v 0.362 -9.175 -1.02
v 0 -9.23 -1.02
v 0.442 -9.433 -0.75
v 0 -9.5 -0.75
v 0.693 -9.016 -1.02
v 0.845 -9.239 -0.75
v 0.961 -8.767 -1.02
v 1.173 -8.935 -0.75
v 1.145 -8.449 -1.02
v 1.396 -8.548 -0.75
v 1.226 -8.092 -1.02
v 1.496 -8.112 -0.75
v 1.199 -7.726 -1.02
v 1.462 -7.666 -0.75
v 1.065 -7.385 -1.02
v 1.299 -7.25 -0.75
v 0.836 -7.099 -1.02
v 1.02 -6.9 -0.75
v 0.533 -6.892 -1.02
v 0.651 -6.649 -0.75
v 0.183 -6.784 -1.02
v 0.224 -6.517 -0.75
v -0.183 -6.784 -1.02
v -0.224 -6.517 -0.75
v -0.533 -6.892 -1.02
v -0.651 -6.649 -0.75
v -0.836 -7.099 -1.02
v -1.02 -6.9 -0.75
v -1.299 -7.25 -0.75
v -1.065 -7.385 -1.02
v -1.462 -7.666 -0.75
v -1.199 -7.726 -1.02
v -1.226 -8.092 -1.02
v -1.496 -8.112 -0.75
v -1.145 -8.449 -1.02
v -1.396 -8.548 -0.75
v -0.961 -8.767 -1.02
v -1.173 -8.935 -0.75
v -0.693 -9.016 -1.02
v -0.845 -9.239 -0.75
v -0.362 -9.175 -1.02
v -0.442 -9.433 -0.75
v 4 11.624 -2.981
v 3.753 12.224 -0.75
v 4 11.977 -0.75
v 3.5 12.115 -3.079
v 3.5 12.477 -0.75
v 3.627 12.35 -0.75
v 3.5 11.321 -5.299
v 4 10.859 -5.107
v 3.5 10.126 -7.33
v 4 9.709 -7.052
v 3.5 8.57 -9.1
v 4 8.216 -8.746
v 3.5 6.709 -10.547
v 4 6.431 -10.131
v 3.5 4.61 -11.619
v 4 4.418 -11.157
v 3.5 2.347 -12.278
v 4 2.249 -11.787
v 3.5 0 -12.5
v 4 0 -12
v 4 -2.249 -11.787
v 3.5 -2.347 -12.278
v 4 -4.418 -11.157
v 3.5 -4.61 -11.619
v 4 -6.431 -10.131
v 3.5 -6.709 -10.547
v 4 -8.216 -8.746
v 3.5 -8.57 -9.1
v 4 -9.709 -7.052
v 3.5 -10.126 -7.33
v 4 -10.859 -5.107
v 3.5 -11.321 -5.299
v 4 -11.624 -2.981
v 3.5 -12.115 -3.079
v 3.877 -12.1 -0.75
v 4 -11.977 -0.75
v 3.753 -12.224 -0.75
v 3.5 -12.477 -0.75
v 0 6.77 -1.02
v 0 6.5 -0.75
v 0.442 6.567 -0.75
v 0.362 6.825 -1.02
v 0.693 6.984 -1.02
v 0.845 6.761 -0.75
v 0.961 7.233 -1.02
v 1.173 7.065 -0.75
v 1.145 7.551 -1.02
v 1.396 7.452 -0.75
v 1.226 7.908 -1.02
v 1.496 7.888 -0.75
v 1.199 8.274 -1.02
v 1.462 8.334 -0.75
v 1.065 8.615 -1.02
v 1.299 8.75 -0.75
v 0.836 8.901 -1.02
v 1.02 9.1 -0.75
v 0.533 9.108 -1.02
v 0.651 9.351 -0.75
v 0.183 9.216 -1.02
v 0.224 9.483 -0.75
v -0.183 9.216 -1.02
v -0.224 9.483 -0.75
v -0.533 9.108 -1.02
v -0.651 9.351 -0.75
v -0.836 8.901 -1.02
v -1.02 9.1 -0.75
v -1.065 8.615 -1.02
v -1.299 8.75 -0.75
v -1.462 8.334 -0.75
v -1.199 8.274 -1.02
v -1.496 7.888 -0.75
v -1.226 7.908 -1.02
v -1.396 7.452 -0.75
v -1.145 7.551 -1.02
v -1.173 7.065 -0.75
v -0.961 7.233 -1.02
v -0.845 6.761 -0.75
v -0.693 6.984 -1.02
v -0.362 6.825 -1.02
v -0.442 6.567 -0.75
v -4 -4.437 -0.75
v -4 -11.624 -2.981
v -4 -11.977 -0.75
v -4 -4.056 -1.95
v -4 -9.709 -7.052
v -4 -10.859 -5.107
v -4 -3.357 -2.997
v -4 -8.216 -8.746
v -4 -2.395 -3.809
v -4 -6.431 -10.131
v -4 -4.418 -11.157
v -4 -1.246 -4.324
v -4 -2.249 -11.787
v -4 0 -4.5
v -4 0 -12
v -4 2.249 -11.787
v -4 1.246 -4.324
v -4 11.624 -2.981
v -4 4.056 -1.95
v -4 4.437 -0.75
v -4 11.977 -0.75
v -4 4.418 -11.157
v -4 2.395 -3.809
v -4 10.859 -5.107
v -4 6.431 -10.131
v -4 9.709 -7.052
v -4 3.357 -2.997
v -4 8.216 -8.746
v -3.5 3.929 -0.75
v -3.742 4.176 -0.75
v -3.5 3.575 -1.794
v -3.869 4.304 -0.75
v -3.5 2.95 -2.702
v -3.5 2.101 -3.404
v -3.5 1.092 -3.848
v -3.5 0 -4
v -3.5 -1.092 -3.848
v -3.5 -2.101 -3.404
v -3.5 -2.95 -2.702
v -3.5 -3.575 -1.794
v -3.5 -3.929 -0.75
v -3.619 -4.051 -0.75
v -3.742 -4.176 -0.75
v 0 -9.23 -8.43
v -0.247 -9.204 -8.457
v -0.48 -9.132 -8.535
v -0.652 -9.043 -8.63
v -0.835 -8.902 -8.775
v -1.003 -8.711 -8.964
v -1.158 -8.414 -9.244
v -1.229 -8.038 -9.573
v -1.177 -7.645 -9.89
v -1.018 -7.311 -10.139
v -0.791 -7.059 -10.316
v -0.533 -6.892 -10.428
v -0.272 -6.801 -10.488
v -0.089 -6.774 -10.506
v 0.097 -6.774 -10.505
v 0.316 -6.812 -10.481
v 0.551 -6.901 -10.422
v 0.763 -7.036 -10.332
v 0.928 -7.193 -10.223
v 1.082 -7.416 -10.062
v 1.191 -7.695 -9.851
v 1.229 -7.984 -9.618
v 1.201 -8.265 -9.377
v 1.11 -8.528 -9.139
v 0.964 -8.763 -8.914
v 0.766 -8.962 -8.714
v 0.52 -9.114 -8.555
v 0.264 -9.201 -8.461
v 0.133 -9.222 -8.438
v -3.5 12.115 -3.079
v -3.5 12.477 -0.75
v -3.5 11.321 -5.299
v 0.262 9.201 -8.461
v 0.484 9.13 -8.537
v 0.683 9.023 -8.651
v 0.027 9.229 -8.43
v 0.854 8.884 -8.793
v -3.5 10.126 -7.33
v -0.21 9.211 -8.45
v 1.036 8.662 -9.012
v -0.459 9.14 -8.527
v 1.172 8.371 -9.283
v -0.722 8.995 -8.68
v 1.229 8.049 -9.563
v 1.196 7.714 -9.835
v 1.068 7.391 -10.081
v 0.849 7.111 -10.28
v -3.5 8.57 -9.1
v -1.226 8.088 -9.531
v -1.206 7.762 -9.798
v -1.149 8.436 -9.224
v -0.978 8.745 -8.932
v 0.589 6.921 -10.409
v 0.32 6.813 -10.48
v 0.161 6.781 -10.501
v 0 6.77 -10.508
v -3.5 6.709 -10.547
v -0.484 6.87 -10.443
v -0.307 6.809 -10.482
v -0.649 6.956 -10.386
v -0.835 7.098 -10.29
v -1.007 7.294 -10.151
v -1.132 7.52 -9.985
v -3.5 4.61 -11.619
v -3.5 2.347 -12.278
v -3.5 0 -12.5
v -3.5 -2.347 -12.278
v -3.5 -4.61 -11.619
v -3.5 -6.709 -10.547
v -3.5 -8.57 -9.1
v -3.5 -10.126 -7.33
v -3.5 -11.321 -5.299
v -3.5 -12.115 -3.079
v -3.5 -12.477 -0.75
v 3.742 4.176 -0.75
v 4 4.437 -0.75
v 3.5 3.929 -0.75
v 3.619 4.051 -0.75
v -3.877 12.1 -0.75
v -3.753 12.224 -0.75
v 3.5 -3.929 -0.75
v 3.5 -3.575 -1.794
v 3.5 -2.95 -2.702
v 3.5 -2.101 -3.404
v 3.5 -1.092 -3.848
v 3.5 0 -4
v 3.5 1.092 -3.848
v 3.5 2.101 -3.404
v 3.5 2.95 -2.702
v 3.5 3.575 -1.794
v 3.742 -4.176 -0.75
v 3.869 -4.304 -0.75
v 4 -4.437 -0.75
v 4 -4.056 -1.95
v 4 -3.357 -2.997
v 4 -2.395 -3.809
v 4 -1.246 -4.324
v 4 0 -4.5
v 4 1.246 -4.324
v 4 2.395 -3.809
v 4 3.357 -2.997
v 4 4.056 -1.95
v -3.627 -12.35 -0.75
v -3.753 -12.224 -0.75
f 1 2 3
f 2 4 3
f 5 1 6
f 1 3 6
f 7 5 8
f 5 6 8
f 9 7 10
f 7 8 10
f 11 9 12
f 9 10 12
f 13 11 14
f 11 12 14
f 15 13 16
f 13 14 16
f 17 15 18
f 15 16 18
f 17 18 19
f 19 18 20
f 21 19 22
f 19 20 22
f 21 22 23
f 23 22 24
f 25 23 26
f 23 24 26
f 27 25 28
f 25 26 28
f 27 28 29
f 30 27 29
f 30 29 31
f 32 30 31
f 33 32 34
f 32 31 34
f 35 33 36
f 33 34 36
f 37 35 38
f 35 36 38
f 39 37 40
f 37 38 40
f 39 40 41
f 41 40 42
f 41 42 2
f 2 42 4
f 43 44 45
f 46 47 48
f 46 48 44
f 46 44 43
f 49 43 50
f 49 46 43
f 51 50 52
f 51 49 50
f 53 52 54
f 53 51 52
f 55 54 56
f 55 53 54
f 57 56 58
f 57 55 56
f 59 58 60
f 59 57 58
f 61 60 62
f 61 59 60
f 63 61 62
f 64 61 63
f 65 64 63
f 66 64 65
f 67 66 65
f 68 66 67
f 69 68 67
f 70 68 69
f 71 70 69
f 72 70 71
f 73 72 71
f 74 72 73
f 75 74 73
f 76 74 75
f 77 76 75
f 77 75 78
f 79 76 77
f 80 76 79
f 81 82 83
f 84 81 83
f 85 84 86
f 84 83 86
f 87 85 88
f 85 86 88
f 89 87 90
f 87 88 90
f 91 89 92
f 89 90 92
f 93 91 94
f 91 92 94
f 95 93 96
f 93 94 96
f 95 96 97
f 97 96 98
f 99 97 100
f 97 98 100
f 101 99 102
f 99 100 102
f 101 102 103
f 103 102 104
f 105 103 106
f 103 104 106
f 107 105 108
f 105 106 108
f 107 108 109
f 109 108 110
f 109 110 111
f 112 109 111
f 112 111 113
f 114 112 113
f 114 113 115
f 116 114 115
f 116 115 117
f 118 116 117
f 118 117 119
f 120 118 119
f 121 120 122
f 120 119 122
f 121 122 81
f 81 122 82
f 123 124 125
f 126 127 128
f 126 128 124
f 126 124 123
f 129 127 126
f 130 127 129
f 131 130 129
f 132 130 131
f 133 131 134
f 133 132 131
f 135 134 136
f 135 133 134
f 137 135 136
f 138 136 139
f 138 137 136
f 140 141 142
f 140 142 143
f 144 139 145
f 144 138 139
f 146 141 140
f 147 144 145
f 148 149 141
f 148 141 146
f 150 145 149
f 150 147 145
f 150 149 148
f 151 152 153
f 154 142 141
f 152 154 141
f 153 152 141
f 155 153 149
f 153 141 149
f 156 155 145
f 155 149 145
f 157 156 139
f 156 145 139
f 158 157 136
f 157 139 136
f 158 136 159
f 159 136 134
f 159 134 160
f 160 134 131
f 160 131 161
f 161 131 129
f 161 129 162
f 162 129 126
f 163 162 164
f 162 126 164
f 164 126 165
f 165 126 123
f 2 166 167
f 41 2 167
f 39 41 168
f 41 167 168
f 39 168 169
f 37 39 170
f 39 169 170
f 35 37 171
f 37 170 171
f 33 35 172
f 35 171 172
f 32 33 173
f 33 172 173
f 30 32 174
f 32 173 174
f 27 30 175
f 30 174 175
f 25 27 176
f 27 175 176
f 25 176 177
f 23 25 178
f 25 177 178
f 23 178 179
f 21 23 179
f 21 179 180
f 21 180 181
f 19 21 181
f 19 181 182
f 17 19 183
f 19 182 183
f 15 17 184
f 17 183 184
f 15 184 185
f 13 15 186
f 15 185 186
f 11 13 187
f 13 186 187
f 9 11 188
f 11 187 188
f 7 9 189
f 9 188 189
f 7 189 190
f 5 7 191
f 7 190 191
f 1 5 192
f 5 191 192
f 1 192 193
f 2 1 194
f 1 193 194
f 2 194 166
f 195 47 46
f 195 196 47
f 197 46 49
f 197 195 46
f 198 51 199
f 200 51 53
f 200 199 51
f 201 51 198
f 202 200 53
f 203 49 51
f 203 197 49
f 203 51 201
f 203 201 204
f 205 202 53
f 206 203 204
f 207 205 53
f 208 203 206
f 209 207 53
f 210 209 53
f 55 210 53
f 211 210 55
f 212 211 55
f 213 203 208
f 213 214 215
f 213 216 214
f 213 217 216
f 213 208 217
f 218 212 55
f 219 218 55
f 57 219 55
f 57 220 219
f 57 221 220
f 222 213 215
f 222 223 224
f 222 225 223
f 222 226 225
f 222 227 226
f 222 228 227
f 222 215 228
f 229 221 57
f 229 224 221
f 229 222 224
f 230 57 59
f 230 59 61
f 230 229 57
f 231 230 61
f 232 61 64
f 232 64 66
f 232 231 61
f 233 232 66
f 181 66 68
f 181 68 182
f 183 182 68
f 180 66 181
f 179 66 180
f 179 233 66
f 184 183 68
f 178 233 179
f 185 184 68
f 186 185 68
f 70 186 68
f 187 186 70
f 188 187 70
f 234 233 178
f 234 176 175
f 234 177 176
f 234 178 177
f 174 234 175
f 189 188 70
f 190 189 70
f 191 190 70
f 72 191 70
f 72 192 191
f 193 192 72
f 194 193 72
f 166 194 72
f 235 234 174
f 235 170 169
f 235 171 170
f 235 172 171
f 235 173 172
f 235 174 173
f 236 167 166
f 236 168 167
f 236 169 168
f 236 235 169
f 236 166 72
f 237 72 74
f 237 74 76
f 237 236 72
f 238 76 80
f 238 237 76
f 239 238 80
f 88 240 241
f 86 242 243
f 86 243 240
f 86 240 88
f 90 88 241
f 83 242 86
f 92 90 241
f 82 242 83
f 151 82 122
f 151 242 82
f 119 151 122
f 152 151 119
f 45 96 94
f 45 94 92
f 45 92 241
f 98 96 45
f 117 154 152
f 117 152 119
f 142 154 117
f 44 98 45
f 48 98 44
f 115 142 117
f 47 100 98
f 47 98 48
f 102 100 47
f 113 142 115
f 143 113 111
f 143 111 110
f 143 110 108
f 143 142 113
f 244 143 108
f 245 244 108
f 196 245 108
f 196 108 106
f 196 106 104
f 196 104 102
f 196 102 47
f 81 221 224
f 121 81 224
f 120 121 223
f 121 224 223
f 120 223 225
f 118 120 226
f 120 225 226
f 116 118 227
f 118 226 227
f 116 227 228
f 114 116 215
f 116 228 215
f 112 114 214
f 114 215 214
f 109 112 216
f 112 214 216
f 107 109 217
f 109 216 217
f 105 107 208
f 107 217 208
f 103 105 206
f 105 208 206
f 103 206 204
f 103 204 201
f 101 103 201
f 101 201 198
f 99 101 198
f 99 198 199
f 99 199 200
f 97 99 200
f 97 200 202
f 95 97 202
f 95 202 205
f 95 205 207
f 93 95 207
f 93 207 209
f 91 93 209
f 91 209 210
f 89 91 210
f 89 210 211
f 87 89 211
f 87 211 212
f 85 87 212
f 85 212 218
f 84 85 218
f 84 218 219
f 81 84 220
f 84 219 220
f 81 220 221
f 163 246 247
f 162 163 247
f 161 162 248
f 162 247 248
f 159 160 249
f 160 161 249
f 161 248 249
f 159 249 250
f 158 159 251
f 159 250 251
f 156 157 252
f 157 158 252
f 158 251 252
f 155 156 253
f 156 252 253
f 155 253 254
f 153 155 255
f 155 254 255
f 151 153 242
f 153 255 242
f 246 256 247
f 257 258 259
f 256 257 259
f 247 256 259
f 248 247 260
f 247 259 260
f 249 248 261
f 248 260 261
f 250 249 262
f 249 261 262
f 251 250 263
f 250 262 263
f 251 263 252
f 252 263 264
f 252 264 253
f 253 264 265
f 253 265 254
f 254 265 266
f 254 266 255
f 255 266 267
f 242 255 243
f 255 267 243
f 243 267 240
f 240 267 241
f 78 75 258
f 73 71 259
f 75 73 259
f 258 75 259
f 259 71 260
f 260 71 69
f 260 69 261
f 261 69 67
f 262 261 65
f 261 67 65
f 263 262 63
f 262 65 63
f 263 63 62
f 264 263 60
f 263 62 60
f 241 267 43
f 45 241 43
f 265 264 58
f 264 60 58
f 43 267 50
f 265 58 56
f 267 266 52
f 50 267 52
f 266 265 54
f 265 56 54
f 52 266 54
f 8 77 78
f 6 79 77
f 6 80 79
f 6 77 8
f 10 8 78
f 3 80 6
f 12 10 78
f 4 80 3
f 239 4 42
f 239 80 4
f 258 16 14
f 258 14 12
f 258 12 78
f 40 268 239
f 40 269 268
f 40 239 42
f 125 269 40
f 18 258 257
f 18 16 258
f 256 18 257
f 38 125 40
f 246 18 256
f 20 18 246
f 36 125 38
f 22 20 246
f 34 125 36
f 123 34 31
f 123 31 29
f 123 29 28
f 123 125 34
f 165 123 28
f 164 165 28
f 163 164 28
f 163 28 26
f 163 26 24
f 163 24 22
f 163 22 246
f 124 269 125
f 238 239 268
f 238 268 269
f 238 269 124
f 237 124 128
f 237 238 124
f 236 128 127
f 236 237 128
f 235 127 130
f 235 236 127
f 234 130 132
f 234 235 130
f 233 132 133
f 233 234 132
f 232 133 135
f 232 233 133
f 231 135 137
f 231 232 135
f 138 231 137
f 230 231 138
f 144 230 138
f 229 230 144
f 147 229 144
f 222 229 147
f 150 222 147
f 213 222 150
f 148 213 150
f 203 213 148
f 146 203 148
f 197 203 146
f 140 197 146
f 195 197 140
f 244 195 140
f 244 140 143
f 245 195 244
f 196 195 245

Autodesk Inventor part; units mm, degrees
sketch "_____1" plane through (0, 0, 0) normal (0, 0, 1) x (1, 0, 0)
  line L0 (50, 0) -> (-50, 0)
  line L1 (-4, 12) -> (-4, 4.5)
  line L2 (-4, 4.5) -> (-3.5, 4)
  line L3 (-3.5, 4) -> (3.5, 4)
  line L4 (3.5, 4) -> (4, 4.5)
  line L5 (4, 4.5) -> (4, 12)
  line L6 (4, 12) -> (3.5, 12.5)
  line L7 (3.5, 12.5) -> (-3.5, 12.5)
  line L8 (-3.5, 12.5) -> (-4, 12)
revolve "Revolution1" add sketch "_____1" angle 180 about axis through (50, 0, 0) along (-1, 0, 0)
sketch "_____2" plane through (0, 0, 0) normal (1, 0, 0) x (0, 0, -1)
  line L0 (-0.75, -25) -> (0.75, -25)
  line L1 (0.75, -25) -> (0.75, 25)
  line L2 (0.75, 25) -> (-0.75, 25)
  line L3 (-0.75, 25) -> (-0.75, -25)
extrude "Extrusion1" cut sketch "_____2" along normal mid plane 16
sketch "Sketch3" plane through (-3.5, 3.9291, -0.75) normal (0, 0, 1) x (1, 0, 0)
  point P0 (3.5, 4.0709)
hole "Hole1" at (0, 8, -0.75) direction (0, 0, -1) diameter 2.459 depth 12.5 countersink diameter 3 countersink angle 90 thread size "M3x0.5" class "6H" standard "ISO Metric profile"
pattern_linear "Rectangular Pattern1" count 2 spacing 16 along (0, -1, 0) of "Hole1"
ref_plane "to_body_XY" through (0, 0, 0) normal (0, 0, 1) x (1, 0, 0)
ref_plane "to_body_YZ" through (0, 0, 0) normal (1, 0, 0) x (0, 1, 0)
ref_plane "to_body_ZX" through (0, 0, 0) normal (0, 1, 0) x (0, 0, 1)
properties part number "C-SCNPAW8-8_2"
